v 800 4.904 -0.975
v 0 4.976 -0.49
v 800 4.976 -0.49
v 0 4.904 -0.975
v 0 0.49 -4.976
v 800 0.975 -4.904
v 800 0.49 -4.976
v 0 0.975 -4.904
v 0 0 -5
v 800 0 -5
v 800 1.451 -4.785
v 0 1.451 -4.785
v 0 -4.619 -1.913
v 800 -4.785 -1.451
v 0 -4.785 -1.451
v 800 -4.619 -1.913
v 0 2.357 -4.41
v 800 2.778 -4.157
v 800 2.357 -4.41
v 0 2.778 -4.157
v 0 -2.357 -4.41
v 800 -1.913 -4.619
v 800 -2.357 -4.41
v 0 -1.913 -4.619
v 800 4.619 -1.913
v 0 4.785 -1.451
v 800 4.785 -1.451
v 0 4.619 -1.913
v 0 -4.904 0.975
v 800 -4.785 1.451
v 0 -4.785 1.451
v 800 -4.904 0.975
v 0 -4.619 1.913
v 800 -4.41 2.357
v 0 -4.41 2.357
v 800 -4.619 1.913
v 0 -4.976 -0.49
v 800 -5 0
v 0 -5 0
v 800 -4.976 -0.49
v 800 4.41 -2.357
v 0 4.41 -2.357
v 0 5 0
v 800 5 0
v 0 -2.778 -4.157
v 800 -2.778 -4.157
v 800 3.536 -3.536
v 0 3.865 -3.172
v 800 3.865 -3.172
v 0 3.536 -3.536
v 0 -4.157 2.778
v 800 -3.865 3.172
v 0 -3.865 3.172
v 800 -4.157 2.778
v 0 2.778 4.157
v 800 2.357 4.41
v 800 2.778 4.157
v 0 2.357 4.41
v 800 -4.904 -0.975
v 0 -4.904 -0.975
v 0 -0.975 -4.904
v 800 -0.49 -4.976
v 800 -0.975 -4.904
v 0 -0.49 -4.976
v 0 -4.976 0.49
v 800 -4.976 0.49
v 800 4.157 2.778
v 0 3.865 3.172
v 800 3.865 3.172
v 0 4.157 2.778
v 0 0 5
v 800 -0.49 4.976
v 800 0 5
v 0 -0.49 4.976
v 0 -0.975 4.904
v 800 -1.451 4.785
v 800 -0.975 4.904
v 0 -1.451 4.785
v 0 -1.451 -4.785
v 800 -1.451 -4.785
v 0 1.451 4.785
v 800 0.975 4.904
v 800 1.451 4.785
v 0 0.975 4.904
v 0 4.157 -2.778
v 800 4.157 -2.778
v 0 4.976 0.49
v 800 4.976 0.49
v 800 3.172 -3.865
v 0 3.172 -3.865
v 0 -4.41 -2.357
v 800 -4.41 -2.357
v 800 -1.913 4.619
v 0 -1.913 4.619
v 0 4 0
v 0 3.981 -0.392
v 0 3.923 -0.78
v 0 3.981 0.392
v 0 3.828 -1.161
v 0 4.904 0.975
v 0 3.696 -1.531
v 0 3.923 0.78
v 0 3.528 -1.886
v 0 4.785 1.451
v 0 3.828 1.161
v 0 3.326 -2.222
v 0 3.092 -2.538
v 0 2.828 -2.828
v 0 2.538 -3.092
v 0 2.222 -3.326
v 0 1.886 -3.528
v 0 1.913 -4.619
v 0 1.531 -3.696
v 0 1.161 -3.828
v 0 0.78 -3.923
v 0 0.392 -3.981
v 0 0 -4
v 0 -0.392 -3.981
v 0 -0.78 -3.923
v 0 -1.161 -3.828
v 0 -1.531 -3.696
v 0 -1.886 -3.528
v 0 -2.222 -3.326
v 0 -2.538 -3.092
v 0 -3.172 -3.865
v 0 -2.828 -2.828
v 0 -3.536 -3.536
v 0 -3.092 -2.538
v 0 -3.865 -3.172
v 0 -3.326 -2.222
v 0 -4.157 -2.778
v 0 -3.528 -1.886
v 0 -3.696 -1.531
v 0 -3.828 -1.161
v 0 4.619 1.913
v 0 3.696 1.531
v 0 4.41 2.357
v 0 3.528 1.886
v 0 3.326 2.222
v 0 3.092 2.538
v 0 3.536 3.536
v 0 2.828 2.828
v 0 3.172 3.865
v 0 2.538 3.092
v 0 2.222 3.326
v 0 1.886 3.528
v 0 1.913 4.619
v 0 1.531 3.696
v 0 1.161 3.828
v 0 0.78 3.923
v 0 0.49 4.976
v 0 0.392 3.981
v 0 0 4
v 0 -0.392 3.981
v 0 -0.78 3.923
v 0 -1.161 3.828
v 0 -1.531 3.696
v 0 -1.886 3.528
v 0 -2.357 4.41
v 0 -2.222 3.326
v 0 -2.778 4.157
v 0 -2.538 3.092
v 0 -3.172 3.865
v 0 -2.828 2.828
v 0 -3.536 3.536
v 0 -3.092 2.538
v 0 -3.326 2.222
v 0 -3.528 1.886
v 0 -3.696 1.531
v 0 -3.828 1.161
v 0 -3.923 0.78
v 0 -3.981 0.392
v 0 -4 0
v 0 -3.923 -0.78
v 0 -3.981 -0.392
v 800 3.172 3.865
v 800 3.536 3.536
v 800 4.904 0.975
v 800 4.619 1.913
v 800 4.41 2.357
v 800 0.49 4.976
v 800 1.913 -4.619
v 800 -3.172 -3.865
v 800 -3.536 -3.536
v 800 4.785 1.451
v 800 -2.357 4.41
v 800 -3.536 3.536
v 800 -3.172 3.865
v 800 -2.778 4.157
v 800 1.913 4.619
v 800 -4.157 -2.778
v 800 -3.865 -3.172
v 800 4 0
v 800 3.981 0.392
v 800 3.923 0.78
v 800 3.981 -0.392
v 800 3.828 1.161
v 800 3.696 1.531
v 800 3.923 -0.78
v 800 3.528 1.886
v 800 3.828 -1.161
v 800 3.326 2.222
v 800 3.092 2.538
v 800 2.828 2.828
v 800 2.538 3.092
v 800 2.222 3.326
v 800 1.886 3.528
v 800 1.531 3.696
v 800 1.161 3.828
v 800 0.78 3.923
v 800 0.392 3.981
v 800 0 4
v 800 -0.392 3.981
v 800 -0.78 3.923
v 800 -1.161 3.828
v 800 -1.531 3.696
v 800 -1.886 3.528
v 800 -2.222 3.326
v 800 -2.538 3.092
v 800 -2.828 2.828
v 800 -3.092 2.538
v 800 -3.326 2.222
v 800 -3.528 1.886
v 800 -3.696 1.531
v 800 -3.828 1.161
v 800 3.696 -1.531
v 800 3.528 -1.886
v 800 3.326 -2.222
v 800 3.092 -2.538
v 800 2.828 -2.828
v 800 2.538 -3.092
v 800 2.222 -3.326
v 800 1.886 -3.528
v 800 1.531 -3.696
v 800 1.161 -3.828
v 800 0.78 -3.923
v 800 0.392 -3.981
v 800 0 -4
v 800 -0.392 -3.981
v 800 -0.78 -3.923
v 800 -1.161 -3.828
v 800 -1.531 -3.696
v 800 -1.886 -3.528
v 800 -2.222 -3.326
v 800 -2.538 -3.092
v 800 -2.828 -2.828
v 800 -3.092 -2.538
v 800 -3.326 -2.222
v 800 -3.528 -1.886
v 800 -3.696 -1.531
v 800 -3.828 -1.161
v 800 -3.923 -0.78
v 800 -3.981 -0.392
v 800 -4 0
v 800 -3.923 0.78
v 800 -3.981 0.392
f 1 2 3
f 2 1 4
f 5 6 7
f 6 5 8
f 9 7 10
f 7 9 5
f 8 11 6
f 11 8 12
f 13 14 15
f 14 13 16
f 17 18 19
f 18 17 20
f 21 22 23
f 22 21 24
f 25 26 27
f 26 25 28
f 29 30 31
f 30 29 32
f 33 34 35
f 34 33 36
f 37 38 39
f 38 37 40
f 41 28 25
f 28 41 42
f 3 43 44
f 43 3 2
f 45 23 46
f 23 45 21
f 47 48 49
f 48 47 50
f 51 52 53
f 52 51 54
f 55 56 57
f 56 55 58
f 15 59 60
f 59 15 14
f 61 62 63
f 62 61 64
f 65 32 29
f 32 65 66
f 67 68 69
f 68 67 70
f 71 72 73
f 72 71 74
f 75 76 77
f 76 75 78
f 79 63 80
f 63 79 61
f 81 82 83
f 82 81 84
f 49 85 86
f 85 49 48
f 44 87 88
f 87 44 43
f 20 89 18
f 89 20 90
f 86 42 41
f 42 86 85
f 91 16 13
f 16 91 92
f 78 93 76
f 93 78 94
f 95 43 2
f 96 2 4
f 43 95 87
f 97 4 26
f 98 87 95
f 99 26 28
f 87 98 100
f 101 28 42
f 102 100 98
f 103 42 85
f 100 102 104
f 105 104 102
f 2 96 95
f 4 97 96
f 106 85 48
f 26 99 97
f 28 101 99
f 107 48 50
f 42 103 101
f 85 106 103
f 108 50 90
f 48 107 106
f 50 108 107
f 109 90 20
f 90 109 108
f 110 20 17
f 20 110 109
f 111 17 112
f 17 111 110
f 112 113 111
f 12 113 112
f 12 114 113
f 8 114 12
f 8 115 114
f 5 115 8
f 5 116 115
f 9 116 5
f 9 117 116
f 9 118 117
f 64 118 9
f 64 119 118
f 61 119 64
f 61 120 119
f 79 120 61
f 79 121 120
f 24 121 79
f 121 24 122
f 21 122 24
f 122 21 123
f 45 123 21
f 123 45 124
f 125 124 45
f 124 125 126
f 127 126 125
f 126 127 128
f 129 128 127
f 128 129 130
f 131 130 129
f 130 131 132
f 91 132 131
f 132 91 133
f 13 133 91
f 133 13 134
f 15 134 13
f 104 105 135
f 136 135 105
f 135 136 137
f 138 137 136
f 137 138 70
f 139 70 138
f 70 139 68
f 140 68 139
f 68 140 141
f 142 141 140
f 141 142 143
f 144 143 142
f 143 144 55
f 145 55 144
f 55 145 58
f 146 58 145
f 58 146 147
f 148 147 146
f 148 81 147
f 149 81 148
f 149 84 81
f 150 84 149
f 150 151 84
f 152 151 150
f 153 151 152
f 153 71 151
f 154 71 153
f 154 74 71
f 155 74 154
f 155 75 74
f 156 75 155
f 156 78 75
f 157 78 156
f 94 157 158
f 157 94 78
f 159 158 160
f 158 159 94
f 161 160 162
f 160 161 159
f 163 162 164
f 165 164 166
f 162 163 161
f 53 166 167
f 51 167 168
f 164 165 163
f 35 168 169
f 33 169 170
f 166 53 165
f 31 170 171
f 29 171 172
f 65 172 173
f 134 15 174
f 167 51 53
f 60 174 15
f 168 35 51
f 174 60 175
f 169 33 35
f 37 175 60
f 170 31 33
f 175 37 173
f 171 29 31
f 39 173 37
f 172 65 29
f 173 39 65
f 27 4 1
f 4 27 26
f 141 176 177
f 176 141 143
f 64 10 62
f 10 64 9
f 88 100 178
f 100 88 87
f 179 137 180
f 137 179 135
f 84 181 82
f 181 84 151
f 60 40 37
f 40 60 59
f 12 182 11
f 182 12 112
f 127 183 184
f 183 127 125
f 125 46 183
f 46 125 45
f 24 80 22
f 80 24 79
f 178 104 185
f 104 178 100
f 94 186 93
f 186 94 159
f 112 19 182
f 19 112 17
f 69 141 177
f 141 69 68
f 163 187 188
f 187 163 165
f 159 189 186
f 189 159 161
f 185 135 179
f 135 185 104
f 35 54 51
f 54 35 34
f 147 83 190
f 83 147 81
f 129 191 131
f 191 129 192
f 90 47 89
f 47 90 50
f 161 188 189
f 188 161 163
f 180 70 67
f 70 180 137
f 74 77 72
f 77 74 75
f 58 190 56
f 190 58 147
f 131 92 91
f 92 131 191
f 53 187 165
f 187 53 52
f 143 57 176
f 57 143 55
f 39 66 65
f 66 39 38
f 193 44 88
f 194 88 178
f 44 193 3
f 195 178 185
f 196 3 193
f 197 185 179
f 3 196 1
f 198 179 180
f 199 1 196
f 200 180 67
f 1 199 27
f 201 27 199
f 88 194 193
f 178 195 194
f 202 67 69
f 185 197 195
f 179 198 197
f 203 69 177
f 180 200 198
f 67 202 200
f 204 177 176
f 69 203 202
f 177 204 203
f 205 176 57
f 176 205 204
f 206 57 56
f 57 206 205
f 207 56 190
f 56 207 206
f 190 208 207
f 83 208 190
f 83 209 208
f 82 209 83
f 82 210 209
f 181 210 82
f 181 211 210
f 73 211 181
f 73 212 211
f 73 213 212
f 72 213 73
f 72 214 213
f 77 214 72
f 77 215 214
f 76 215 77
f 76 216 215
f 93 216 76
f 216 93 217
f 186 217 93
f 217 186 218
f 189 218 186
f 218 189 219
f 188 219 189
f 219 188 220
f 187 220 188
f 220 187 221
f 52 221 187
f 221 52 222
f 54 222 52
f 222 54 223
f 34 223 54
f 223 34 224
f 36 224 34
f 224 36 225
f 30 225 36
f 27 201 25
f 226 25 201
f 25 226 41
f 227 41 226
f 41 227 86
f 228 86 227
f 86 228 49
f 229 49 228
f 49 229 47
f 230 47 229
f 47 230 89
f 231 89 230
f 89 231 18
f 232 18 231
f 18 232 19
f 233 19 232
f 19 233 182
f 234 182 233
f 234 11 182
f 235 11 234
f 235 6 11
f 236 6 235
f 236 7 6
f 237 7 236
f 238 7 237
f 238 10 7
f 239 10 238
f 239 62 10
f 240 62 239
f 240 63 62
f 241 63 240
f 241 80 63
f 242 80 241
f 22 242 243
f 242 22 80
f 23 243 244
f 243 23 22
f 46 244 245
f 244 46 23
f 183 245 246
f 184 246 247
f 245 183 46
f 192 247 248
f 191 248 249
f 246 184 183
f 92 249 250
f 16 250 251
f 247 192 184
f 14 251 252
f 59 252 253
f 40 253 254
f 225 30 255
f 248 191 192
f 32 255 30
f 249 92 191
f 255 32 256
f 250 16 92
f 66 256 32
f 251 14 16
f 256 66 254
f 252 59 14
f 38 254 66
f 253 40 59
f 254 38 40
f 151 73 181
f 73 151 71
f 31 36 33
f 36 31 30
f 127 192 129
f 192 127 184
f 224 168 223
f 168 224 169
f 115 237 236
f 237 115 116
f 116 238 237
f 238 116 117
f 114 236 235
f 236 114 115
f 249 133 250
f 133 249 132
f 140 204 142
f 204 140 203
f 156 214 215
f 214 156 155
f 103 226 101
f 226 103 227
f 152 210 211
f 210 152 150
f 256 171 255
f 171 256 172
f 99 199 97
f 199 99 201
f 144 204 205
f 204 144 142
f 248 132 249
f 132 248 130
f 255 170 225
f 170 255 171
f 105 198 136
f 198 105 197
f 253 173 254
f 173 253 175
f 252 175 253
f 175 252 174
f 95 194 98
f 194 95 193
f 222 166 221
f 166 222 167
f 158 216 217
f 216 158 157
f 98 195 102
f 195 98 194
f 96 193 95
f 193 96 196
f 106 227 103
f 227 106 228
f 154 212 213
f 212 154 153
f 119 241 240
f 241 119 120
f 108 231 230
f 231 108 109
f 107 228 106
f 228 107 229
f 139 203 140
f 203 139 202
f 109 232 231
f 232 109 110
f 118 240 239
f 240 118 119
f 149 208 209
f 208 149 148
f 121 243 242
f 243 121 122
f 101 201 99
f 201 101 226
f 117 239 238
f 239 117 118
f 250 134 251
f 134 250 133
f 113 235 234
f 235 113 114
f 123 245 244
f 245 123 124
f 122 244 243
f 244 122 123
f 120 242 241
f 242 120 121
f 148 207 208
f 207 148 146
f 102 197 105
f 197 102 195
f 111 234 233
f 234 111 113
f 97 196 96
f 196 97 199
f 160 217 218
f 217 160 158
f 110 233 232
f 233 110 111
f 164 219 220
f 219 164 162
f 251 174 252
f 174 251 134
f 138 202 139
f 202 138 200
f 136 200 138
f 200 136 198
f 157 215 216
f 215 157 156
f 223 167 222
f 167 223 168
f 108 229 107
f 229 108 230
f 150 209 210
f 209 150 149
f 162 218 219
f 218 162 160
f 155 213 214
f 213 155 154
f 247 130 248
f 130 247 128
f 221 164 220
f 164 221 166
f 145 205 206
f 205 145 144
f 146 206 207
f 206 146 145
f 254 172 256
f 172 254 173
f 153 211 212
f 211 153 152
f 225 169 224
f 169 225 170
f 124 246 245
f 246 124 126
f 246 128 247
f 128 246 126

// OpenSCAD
// HUB75 display frame - V1.2 aluminium stiffening tube
//
// Self-contained component.
// No project_config.scad dependency.

/* [Tube] */
tube_length = 800.0;
tube_outer_diameter = 10.0;
tube_wall_thickness = 1.0;

/* [Preview] */
preview_color = [0.72, 0.74, 0.76, 1];

/* [Resolution] */
$fn = 64;


function aluminium_tube_default_length() = tube_length;
function aluminium_tube_outer_diameter() = tube_outer_diameter;
function aluminium_tube_wall_thickness() = tube_wall_thickness;
function aluminium_tube_inner_diameter() = tube_outer_diameter - 2*tube_wall_thickness;

module aluminium_stiffening_tube(
    length = tube_length,
    outer_diameter = tube_outer_diameter,
    wall_thickness = tube_wall_thickness,
    part_color = preview_color
) {
    inner_diameter =
        outer_diameter - 2 * wall_thickness;

    color(part_color)
        rotate([0, 90, 0])
            difference() {
                cylinder(
                    h=length,
                    d=outer_diameter
                );

                translate([0, 0, -0.1])
                    cylinder(
                        h=length + 0.2,
                        d=inner_diameter
                    );
            }
}


// Standalone preview
aluminium_stiffening_tube();
